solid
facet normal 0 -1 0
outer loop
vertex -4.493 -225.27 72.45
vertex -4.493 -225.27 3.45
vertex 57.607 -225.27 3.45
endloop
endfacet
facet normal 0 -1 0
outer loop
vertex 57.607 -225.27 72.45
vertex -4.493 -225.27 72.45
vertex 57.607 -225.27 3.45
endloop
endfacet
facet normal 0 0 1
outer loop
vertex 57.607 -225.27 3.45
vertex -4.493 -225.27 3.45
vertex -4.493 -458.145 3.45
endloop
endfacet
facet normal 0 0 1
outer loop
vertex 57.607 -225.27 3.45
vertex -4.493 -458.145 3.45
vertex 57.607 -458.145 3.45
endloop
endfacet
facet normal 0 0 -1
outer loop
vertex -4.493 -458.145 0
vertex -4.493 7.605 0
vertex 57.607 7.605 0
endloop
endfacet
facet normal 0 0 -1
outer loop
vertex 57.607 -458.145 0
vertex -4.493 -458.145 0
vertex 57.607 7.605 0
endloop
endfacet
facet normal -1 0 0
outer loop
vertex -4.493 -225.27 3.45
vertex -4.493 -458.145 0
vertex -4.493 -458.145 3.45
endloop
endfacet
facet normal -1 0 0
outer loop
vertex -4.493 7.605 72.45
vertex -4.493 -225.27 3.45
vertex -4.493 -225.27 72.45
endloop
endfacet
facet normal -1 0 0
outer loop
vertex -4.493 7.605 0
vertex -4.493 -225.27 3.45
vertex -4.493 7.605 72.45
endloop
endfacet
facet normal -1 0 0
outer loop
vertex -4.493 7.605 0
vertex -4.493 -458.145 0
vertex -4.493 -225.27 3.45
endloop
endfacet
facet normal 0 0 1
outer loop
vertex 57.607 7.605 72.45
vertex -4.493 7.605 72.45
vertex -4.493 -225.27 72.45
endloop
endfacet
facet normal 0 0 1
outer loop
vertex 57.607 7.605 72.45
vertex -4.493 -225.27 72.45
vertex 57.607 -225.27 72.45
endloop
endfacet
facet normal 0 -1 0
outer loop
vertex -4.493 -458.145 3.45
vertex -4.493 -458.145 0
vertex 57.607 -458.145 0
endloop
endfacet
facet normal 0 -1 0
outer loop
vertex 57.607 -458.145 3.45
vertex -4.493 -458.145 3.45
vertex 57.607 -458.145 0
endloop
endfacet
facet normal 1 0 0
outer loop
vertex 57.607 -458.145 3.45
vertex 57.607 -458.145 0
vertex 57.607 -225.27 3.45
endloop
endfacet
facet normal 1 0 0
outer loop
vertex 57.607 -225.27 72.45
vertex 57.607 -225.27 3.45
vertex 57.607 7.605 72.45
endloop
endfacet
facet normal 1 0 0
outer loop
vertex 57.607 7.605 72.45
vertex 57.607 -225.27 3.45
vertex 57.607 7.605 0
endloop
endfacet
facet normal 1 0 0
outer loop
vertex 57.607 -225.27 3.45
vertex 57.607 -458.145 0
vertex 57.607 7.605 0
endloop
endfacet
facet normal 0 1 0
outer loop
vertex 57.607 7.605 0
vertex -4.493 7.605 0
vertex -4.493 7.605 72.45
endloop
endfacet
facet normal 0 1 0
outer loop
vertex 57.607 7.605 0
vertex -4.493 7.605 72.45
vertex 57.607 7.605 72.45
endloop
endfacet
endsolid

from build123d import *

# Parameters (mm, degrees)
SKETCH_1_W      = 180
SKETCH_1_H      = 1350
EXTRUDE_1_DEPTH = 10
SKETCH_2_W      = 180
SKETCH_2_H      = 675
EXTRUDE_2_DEPTH = 200
SCALE_1_SCALE   = 0.345


with BuildPart() as part:
    # 草图1 → 凸台-拉伸1 (new body)
    with BuildSketch(Plane.XY):
        with Locations((76.977478815, -652.957853403)):
            Rectangle(SKETCH_1_W, SKETCH_1_H)
    extrude(amount=EXTRUDE_1_DEPTH)

    # 草图2 → 凸台-拉伸2 (add)
    with BuildSketch(Plane.XY.offset(10)):
        with Locations((76.977478815, -315.457853403)):
            Rectangle(SKETCH_2_W, SKETCH_2_H)
    extrude(amount=EXTRUDE_2_DEPTH)


with BuildPart() as part_1:
    # 缩放比例1: scaled about (0, 0, 0)
    add(part.part.scale(SCALE_1_SCALE))


solid = part_1.part
